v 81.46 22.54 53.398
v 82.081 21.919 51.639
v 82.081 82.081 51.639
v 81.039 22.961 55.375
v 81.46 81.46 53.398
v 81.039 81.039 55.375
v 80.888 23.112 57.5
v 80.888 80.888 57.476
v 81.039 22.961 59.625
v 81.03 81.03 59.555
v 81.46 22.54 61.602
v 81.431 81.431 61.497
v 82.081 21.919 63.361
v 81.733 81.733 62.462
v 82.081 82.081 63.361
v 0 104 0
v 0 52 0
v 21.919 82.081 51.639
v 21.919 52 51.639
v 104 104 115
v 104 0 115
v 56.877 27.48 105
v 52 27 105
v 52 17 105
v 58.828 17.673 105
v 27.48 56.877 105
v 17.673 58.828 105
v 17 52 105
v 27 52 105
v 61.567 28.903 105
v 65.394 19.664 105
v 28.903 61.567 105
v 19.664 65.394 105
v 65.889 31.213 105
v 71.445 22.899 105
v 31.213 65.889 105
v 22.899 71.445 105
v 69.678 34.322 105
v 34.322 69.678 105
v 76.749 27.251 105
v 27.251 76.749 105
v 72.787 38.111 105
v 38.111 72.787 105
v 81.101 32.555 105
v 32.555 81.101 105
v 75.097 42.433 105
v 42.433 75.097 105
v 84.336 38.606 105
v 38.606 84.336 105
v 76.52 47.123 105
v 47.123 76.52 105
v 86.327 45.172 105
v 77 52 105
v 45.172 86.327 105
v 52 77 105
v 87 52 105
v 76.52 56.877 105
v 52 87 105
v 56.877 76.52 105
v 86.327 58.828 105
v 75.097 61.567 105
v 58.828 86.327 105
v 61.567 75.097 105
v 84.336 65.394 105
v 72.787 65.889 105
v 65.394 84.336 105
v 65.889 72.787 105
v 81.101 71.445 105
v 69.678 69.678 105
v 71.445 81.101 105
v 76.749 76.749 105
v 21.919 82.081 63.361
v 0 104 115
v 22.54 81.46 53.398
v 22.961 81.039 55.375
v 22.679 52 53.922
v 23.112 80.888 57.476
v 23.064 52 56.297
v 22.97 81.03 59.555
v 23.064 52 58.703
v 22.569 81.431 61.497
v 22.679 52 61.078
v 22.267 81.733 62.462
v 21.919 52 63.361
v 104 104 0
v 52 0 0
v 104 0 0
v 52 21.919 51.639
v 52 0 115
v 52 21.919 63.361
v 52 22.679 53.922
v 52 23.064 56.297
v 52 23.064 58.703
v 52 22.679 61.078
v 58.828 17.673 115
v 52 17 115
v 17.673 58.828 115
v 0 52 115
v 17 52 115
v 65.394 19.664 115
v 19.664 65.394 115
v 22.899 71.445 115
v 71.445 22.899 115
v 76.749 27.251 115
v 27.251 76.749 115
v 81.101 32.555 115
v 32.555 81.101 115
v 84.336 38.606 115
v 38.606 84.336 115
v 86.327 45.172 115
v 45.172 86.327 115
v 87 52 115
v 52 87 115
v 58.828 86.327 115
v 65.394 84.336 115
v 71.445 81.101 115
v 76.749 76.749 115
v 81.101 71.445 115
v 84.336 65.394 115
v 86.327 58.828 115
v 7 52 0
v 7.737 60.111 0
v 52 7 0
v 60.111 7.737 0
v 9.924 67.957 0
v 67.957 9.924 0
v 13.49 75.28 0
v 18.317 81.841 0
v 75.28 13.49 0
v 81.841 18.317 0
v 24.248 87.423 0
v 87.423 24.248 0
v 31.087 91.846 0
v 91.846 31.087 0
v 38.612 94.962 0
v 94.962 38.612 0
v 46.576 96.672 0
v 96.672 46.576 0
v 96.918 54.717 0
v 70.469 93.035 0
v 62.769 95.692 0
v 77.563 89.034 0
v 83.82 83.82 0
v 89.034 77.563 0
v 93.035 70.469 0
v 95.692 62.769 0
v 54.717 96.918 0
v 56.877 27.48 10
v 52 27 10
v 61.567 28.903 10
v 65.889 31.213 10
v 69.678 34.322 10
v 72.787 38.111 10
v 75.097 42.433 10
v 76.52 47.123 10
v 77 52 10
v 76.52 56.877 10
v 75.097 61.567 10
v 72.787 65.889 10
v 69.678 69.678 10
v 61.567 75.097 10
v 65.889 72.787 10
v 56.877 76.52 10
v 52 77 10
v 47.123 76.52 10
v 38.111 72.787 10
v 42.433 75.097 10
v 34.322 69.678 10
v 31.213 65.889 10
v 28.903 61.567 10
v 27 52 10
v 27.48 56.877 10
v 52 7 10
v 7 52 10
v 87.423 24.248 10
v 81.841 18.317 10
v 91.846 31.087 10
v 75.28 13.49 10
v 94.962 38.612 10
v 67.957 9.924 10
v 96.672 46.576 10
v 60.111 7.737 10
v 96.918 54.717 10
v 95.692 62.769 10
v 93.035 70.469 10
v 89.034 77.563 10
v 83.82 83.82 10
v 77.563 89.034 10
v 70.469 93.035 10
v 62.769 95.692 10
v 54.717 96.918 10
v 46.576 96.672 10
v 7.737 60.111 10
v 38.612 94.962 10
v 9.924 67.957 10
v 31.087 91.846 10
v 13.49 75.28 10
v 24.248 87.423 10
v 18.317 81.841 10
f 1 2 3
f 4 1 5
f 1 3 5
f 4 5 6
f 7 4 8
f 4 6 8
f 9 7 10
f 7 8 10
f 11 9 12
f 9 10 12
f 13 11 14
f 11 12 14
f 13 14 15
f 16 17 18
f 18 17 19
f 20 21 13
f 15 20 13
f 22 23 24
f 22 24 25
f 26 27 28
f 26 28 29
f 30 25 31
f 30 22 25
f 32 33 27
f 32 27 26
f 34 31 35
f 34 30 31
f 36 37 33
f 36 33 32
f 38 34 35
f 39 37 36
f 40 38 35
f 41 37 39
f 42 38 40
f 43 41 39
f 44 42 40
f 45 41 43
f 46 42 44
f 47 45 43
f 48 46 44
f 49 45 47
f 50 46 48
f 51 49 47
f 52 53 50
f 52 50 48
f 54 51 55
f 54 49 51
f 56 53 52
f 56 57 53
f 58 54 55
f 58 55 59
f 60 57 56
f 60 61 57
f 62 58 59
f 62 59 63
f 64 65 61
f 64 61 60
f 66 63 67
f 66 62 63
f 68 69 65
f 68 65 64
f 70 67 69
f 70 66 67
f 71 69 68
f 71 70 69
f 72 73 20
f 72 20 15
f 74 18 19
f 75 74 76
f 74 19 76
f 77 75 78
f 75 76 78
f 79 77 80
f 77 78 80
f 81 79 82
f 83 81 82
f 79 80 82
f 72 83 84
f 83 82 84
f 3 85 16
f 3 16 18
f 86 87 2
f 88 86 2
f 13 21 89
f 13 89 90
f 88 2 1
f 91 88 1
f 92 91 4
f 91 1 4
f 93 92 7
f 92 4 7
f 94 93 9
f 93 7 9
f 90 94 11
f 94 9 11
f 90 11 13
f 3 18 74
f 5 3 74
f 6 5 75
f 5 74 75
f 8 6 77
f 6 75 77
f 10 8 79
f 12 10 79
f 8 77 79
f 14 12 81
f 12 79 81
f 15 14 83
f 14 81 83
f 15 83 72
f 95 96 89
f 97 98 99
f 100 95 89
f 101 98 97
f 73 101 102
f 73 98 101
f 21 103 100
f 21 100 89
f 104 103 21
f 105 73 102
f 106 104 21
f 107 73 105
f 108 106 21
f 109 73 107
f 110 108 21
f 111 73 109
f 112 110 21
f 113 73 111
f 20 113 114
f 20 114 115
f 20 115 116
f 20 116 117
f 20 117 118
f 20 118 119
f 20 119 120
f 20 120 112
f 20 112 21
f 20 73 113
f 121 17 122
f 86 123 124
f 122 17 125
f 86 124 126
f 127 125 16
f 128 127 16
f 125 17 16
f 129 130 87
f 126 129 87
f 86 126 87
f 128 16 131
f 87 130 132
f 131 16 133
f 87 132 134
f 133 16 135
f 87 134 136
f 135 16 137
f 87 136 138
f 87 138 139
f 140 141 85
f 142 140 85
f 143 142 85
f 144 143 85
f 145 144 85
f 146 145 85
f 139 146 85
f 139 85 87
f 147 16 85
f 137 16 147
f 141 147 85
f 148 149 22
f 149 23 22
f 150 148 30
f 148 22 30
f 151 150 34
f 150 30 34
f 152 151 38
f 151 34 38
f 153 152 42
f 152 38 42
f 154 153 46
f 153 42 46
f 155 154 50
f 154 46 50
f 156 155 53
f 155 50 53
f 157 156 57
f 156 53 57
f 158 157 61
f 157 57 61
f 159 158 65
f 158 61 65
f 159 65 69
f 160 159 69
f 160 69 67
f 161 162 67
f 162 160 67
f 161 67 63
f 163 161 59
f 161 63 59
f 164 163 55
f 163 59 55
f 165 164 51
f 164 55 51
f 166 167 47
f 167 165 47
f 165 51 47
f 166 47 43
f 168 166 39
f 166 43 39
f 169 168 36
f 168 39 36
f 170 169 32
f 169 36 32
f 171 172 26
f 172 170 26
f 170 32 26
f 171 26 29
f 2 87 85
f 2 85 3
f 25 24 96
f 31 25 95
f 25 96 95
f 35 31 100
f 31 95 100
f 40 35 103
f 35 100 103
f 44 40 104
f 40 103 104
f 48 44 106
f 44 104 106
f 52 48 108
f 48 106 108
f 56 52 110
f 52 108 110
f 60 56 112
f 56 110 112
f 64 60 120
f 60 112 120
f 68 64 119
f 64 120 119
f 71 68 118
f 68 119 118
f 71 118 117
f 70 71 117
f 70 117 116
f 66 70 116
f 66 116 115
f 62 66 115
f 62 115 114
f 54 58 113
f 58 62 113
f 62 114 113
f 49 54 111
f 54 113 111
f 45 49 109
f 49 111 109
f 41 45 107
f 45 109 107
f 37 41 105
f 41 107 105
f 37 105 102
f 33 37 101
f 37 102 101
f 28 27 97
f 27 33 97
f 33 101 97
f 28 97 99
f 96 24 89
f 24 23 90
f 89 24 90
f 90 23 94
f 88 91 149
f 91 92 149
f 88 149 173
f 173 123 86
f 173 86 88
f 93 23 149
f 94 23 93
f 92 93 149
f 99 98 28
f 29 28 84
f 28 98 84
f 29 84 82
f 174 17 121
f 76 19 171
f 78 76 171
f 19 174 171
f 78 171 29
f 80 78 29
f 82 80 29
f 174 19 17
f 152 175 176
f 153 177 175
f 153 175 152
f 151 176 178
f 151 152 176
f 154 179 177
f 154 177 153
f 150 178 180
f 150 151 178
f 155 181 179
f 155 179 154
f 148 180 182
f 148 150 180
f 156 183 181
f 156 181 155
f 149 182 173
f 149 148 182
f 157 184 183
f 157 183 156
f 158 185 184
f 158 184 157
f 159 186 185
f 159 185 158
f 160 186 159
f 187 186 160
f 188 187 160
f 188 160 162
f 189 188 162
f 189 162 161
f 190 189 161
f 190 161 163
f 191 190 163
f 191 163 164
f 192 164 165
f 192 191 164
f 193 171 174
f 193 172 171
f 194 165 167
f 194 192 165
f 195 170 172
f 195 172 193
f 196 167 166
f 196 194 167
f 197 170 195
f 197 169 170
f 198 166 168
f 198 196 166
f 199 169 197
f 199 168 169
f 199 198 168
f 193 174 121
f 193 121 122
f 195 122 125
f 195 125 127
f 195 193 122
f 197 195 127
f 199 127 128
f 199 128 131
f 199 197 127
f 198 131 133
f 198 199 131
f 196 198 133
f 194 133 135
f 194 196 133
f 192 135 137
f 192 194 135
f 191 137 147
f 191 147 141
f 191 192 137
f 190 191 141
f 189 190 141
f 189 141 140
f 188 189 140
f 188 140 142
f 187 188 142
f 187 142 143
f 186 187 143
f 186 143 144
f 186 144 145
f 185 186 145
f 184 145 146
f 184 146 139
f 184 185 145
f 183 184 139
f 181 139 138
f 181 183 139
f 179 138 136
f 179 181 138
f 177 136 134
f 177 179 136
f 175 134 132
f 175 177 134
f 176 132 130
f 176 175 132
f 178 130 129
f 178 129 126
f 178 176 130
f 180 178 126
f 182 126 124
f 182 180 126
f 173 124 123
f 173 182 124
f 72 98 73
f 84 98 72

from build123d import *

# Parameters (mm, degrees)
SKETCH4_W               = 104
SKETCH4_H               = 104
BOSS_EXTRUDE2_DEPTH     = 57.5
BOSS_EXTRUDE2_TAPER     = 23
SKETCH6_R               = 25
CUT_EXTRUDE1_DEPTH      = 179.5
CUT_EXTRUDE_THIN1_START = 10
CUT_EXTRUDE_THIN1_DEPTH = 10
CUT_EXTRUDE3_DEPTH      = 124
SKETCH10_R              = 35
CUT_EXTRUDE4_DEPTH      = 10
FILLET9_R               = 15
FILLET10_R              = 15


with BuildPart() as part:
    # Sketch4 → Boss-Extrude2 (new body)
    with BuildSketch(Plane.XY):
        with Locations((52, 52)):
            Rectangle(SKETCH4_W, SKETCH4_H)
    boss_extrude2 = extrude(amount=BOSS_EXTRUDE2_DEPTH, taper=BOSS_EXTRUDE2_TAPER)

    # Mirror2: Boss-Extrude2 across plane
    add(boss_extrude2.mirror(Plane(origin=(0, 0, 57.5), x_dir=(1, 0, 0), z_dir=(0, 0, -1))))

    # Sketch6 → Cut-Extrude1 (cut)
    with BuildSketch(Plane.XY.offset(115)):
        with Locations((52, 52)):
            Circle(SKETCH6_R)
    extrude(amount=-CUT_EXTRUDE1_DEPTH, mode=Mode.SUBTRACT)

    # Sketch8 → Cut-Extrude-Thin1 (cut)
    with BuildSketch(Plane.XY.offset(CUT_EXTRUDE_THIN1_START)):
        with BuildLine():
            ThreePointArc((52, 17), (76.748737342, 76.748737342), (17, 52))
            Line((17, 52), (7, 52))
            ThreePointArc((7, 52), (83.819805153, 83.819805153), (52, 7))
            Line((52, 7), (52, 17))
        make_face()
        with BuildLine():
            ThreePointArc((52, 27), (69.67766953, 69.67766953), (27, 52))
            Line((27, 52), (17, 52))
            ThreePointArc((17, 52), (76.748737342, 76.748737342), (52, 17))
            Line((52, 17), (52, 27))
        make_face()
    extrude(amount=-CUT_EXTRUDE_THIN1_DEPTH, mode=Mode.SUBTRACT)

    # Sketch9 → Cut-Extrude3 (cut)
    with BuildSketch(Plane(origin=(0, 0, 0), x_dir=(-1, 0, 0), z_dir=(0, 0, -1))):
        Polygon((-27, 52), (0, 52), (0, 0), (-52, 0), (-52, 27), (-52, 52), align=None)
    extrude(amount=-CUT_EXTRUDE3_DEPTH, mode=Mode.SUBTRACT)

    # Sketch10 → Cut-Extrude4 (cut)
    with BuildSketch(Plane.XY.offset(115)):
        with Locations((52, 52)):
            Circle(SKETCH10_R)
    extrude(amount=-CUT_EXTRUDE4_DEPTH, mode=Mode.SUBTRACT)

    # Fillet9
    fillet9_edges = [part.edges().sort_by_distance(p)[0] for p in [
        (65.796349034, 24.407301932, 57.5),
    ]]
    fillet(fillet9_edges, radius=FILLET9_R)

    # Fillet10
    fillet10_edges = [part.edges().sort_by_distance(p)[0] for p in [
        (24.407301932, 65.796349034, 57.5),
        (52, 79.592698068, 57.5),
        (79.592698068, 51.352297169, 57.5),
    ]]
    fillet(fillet10_edges, radius=FILLET10_R)


solid = part.part
